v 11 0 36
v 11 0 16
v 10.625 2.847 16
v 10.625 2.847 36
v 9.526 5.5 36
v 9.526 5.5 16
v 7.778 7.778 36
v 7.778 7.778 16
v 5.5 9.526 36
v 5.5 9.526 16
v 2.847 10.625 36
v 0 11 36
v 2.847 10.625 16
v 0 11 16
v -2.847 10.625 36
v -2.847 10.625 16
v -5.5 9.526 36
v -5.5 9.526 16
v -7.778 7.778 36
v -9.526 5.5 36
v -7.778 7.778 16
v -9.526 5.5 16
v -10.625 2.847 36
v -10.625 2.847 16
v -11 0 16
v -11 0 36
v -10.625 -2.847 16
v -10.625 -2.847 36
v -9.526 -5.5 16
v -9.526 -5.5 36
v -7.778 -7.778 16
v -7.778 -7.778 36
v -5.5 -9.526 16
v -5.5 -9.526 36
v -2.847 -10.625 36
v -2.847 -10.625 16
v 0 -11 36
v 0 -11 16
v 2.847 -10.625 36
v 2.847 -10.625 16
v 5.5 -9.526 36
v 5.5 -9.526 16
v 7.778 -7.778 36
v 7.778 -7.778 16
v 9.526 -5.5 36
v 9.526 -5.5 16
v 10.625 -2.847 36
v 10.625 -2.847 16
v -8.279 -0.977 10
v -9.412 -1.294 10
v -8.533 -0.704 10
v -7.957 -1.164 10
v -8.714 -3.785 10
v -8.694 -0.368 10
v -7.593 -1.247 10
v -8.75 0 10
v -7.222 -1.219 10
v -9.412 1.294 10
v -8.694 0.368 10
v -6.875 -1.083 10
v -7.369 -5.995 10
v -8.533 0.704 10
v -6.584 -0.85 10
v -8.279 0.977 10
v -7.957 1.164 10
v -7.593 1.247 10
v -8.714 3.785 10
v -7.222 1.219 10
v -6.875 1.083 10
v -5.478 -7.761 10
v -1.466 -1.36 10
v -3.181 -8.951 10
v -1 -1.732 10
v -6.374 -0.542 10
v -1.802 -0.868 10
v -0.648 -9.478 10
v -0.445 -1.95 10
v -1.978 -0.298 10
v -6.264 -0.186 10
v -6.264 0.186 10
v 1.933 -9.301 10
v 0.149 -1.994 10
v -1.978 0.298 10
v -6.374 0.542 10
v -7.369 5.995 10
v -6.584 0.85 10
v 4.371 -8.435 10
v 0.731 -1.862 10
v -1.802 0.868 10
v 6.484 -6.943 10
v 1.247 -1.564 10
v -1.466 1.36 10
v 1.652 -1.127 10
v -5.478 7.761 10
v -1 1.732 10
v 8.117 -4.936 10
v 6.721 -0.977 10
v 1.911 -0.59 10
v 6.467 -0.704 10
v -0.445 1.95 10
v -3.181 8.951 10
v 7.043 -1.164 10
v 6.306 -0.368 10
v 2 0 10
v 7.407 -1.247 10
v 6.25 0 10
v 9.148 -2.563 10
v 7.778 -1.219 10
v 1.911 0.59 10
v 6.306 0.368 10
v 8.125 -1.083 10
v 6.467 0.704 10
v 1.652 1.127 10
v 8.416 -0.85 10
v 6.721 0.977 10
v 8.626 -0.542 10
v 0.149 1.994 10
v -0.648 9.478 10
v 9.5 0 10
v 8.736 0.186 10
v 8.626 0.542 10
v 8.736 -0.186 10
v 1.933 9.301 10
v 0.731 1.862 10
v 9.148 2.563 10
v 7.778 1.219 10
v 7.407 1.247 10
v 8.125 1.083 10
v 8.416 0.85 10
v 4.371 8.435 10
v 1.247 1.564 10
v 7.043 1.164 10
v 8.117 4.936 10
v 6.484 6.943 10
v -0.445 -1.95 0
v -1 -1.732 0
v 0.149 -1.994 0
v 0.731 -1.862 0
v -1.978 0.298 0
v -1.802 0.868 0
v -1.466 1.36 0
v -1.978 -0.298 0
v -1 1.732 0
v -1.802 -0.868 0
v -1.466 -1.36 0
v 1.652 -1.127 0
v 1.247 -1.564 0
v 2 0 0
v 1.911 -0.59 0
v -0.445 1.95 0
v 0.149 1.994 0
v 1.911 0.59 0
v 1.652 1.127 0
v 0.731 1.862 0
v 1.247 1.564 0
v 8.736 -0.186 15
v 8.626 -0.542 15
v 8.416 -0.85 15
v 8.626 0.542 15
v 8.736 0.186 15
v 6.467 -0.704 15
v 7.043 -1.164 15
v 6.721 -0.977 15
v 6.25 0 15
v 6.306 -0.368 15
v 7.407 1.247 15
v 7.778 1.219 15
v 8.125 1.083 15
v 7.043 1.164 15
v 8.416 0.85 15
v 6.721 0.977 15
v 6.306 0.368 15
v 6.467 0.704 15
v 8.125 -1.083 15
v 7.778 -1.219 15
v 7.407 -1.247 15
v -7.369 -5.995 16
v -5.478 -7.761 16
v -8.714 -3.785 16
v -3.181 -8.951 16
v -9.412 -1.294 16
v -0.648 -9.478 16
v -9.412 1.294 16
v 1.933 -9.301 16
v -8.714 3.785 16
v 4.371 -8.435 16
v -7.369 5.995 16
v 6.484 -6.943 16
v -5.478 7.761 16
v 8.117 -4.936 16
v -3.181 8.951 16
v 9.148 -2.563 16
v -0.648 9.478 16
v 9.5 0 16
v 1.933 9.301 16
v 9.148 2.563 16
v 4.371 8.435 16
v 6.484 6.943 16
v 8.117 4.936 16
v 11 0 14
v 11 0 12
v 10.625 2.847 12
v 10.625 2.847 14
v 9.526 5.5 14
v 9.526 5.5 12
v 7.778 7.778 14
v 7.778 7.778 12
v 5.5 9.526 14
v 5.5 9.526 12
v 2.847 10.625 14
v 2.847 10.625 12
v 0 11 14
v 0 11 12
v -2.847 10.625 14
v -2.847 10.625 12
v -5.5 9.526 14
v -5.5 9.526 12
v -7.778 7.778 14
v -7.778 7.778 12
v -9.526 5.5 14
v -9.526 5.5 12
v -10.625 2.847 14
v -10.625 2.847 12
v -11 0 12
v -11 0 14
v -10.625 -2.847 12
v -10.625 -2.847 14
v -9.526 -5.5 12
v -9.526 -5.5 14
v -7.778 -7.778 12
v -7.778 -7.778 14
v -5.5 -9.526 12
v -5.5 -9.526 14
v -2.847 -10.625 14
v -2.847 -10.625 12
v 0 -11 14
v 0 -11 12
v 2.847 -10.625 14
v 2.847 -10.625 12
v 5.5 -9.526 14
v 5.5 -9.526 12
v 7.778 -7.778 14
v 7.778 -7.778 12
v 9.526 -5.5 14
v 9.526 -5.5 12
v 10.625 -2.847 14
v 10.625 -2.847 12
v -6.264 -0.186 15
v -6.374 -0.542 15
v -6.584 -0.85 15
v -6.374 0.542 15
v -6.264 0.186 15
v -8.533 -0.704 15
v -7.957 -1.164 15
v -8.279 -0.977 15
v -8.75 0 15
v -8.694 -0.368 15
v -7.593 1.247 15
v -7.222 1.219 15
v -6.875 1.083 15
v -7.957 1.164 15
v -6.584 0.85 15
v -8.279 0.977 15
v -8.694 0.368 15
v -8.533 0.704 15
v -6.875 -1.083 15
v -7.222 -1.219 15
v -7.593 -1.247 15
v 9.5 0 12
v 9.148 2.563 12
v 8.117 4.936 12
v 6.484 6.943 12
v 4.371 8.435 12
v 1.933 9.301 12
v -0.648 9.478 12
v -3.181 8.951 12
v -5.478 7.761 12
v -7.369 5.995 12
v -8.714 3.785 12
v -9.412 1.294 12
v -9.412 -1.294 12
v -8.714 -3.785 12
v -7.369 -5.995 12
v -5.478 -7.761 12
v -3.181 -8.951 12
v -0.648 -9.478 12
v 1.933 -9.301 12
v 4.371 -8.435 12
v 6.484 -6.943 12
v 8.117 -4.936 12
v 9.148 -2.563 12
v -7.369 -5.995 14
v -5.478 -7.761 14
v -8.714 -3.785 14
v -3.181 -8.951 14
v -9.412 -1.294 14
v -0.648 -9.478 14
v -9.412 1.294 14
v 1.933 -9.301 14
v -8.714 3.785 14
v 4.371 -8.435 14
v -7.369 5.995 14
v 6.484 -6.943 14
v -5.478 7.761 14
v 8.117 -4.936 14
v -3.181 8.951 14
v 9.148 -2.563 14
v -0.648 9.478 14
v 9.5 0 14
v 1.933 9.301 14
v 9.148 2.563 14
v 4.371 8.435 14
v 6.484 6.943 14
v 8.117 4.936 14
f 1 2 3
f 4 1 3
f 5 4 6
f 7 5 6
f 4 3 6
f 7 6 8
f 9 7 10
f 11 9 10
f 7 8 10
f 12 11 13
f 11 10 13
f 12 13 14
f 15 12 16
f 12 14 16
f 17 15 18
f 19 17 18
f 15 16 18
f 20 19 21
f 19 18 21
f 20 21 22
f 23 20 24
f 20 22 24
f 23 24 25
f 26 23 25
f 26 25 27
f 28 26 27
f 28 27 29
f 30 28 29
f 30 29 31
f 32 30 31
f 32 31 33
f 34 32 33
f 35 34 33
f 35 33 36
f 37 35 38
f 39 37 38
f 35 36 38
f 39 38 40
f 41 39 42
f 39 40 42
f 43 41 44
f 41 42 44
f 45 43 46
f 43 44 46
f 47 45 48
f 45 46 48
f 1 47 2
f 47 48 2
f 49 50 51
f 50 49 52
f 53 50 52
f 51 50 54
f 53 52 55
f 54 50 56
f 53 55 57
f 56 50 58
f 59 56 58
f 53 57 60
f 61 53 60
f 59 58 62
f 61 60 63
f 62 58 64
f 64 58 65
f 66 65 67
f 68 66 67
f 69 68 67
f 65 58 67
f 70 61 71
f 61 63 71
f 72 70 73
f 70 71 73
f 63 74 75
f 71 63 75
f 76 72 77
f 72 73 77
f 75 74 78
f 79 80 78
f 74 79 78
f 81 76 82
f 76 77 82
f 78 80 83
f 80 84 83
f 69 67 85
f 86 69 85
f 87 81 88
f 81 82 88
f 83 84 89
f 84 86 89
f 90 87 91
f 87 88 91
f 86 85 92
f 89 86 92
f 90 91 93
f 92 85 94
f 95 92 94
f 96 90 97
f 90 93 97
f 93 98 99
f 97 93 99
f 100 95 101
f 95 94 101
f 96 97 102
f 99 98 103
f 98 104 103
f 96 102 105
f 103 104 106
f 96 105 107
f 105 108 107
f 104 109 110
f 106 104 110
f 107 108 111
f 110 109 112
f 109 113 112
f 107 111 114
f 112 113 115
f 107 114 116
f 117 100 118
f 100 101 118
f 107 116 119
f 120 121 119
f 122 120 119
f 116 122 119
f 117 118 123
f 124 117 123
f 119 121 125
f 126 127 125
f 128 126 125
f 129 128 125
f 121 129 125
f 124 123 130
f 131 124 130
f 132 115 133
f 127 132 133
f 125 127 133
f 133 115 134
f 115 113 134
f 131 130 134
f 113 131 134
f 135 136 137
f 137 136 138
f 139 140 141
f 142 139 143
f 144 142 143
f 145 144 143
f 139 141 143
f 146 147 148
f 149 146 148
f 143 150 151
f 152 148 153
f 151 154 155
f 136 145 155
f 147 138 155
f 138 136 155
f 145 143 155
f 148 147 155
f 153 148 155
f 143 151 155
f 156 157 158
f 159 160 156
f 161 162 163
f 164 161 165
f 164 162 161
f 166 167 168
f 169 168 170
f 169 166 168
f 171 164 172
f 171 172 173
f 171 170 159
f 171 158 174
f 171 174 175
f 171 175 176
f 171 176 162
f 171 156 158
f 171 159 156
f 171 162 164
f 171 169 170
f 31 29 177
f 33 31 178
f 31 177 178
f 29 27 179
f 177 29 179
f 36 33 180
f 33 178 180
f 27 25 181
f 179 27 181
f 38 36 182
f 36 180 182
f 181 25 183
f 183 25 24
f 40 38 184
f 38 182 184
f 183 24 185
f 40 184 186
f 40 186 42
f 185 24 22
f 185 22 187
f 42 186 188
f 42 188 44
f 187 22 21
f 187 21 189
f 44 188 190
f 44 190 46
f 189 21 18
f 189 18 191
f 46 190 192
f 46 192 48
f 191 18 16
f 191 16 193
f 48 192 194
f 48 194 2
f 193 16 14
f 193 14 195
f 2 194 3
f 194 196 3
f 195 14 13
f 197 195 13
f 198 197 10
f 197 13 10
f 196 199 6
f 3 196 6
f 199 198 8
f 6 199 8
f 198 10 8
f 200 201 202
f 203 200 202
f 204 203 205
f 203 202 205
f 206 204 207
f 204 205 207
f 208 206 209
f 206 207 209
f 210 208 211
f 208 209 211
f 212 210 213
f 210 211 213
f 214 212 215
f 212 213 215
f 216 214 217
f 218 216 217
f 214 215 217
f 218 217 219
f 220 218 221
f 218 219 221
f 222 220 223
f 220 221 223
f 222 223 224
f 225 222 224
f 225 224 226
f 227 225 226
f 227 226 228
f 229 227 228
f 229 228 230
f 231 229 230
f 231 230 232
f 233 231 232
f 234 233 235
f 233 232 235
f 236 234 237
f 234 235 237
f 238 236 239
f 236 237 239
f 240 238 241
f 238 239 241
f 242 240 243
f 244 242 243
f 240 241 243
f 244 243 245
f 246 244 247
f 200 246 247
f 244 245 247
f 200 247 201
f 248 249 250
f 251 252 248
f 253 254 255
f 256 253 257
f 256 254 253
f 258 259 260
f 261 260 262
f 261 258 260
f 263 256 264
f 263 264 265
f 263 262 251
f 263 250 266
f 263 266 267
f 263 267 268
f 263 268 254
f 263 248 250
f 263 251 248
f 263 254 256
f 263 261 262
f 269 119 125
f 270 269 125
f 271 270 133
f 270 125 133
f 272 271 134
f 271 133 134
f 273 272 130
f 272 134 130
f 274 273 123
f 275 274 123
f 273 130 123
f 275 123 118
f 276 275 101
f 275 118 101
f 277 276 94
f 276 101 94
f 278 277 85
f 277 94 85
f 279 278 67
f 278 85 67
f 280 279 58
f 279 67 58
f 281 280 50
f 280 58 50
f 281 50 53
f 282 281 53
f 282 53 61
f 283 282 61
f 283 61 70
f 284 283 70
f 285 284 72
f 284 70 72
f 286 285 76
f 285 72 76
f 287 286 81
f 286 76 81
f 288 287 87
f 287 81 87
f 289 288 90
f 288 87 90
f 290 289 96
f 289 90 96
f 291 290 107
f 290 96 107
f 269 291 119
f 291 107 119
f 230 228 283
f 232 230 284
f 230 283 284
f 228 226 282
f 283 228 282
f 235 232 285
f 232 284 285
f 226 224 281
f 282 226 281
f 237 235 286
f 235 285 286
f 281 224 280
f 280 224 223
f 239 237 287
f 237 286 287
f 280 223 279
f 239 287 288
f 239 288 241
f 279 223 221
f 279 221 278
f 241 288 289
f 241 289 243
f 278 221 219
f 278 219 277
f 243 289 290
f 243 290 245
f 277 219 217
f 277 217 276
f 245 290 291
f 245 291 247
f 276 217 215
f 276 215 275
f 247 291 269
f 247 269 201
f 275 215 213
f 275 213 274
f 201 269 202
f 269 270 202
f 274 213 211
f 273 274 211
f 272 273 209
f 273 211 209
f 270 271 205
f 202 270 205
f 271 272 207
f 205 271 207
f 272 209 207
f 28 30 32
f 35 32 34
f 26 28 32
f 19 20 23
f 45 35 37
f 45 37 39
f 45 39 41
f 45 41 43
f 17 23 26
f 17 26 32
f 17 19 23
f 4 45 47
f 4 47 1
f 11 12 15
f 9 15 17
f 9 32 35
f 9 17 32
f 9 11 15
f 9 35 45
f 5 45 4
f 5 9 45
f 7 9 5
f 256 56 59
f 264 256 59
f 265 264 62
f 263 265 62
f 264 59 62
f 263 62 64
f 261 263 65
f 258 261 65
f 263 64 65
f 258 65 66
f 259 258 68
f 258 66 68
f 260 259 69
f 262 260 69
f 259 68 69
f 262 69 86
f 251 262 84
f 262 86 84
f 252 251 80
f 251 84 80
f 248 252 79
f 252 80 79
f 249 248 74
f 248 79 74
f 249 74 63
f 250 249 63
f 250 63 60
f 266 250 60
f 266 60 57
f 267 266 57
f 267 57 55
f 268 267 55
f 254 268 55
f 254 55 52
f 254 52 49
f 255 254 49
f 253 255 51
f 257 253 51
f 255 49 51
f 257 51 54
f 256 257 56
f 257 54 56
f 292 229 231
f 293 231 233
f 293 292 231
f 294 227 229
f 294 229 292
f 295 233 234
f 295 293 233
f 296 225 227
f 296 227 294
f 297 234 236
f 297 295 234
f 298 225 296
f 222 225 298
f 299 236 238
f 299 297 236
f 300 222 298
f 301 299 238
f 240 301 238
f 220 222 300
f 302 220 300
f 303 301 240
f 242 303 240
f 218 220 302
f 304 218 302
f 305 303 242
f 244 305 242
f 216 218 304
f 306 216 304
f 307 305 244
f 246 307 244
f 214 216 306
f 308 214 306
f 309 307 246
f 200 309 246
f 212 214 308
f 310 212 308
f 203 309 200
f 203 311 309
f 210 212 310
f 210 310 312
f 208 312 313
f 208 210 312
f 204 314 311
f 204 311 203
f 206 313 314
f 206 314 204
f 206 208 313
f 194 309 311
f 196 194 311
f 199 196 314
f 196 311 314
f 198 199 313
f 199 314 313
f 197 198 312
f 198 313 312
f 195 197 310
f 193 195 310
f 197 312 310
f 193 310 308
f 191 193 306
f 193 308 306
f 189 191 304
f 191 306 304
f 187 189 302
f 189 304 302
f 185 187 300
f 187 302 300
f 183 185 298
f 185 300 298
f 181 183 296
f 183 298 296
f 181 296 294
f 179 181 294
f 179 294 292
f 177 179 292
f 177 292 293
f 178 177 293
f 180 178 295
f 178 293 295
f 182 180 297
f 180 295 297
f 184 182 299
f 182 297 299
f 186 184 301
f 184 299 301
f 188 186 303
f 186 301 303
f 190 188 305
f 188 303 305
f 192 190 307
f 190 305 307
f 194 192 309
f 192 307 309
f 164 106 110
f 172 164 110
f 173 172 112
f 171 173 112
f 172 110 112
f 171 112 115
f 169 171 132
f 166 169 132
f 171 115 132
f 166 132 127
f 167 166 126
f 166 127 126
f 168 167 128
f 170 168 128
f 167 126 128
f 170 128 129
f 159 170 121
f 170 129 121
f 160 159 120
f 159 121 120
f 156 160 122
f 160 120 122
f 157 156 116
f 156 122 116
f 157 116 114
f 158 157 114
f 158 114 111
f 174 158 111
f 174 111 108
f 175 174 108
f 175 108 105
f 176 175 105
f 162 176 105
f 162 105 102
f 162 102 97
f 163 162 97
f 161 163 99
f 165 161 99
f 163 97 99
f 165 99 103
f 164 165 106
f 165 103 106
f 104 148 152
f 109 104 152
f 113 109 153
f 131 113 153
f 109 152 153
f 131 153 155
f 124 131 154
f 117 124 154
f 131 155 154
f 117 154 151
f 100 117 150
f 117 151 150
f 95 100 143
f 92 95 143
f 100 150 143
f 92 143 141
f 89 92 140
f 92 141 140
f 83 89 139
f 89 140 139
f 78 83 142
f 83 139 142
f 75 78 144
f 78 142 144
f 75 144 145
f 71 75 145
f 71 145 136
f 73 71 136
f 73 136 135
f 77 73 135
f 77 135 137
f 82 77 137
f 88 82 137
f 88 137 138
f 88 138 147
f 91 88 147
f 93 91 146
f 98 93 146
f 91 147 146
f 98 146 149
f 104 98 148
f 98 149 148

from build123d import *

# Parameters (mm, degrees)
SKETCH1_R           = 2
BOSS_EXTRUDE1_DEPTH = 10
SKETCH2_R           = 9.5
BOSS_EXTRUDE2_DEPTH = 2
SKETCH3_R           = 11
BOSS_EXTRUDE3_DEPTH = 2
SKETCH4_R           = 9.5
BOSS_EXTRUDE4_DEPTH = 2
SKETCH5_R           = 11
BOSS_EXTRUDE5_DEPTH = 20
SKETCH6_R           = 1.25
CUT_EXTRUDE1_DEPTH  = 5


with BuildPart() as part:
    # Sketch1 → Boss-Extrude1 (new body)
    with BuildSketch(Plane.XY):
        Circle(SKETCH1_R)
    extrude(amount=BOSS_EXTRUDE1_DEPTH)

    # Sketch2 → Boss-Extrude2 (add)
    with BuildSketch(Plane.XY.offset(10)):
        Circle(SKETCH2_R)
    extrude(amount=BOSS_EXTRUDE2_DEPTH)

    # Sketch3 → Boss-Extrude3 (add)
    with BuildSketch(Plane.XY.offset(12)):
        Circle(SKETCH3_R)
    extrude(amount=BOSS_EXTRUDE3_DEPTH)

    # Sketch4 → Boss-Extrude4 (add)
    with BuildSketch(Plane.XY.offset(14)):
        Circle(SKETCH4_R)
    extrude(amount=BOSS_EXTRUDE4_DEPTH)

    # Sketch5 → Boss-Extrude5 (add)
    with BuildSketch(Plane.XY.offset(16)):
        Circle(SKETCH5_R)
    extrude(amount=BOSS_EXTRUDE5_DEPTH)

    # Sketch6 → Cut-Extrude1 (cut)
    with BuildSketch(Plane(origin=(0, 0, 10), x_dir=(-1, 0, 0), z_dir=(0, 0, -1))):
        with Locations((-7.5, 0)):
            Circle(SKETCH6_R)
        with Locations((7.5, 0)):
            Circle(SKETCH6_R)
    extrude(amount=-CUT_EXTRUDE1_DEPTH, mode=Mode.SUBTRACT)


solid = part.part
